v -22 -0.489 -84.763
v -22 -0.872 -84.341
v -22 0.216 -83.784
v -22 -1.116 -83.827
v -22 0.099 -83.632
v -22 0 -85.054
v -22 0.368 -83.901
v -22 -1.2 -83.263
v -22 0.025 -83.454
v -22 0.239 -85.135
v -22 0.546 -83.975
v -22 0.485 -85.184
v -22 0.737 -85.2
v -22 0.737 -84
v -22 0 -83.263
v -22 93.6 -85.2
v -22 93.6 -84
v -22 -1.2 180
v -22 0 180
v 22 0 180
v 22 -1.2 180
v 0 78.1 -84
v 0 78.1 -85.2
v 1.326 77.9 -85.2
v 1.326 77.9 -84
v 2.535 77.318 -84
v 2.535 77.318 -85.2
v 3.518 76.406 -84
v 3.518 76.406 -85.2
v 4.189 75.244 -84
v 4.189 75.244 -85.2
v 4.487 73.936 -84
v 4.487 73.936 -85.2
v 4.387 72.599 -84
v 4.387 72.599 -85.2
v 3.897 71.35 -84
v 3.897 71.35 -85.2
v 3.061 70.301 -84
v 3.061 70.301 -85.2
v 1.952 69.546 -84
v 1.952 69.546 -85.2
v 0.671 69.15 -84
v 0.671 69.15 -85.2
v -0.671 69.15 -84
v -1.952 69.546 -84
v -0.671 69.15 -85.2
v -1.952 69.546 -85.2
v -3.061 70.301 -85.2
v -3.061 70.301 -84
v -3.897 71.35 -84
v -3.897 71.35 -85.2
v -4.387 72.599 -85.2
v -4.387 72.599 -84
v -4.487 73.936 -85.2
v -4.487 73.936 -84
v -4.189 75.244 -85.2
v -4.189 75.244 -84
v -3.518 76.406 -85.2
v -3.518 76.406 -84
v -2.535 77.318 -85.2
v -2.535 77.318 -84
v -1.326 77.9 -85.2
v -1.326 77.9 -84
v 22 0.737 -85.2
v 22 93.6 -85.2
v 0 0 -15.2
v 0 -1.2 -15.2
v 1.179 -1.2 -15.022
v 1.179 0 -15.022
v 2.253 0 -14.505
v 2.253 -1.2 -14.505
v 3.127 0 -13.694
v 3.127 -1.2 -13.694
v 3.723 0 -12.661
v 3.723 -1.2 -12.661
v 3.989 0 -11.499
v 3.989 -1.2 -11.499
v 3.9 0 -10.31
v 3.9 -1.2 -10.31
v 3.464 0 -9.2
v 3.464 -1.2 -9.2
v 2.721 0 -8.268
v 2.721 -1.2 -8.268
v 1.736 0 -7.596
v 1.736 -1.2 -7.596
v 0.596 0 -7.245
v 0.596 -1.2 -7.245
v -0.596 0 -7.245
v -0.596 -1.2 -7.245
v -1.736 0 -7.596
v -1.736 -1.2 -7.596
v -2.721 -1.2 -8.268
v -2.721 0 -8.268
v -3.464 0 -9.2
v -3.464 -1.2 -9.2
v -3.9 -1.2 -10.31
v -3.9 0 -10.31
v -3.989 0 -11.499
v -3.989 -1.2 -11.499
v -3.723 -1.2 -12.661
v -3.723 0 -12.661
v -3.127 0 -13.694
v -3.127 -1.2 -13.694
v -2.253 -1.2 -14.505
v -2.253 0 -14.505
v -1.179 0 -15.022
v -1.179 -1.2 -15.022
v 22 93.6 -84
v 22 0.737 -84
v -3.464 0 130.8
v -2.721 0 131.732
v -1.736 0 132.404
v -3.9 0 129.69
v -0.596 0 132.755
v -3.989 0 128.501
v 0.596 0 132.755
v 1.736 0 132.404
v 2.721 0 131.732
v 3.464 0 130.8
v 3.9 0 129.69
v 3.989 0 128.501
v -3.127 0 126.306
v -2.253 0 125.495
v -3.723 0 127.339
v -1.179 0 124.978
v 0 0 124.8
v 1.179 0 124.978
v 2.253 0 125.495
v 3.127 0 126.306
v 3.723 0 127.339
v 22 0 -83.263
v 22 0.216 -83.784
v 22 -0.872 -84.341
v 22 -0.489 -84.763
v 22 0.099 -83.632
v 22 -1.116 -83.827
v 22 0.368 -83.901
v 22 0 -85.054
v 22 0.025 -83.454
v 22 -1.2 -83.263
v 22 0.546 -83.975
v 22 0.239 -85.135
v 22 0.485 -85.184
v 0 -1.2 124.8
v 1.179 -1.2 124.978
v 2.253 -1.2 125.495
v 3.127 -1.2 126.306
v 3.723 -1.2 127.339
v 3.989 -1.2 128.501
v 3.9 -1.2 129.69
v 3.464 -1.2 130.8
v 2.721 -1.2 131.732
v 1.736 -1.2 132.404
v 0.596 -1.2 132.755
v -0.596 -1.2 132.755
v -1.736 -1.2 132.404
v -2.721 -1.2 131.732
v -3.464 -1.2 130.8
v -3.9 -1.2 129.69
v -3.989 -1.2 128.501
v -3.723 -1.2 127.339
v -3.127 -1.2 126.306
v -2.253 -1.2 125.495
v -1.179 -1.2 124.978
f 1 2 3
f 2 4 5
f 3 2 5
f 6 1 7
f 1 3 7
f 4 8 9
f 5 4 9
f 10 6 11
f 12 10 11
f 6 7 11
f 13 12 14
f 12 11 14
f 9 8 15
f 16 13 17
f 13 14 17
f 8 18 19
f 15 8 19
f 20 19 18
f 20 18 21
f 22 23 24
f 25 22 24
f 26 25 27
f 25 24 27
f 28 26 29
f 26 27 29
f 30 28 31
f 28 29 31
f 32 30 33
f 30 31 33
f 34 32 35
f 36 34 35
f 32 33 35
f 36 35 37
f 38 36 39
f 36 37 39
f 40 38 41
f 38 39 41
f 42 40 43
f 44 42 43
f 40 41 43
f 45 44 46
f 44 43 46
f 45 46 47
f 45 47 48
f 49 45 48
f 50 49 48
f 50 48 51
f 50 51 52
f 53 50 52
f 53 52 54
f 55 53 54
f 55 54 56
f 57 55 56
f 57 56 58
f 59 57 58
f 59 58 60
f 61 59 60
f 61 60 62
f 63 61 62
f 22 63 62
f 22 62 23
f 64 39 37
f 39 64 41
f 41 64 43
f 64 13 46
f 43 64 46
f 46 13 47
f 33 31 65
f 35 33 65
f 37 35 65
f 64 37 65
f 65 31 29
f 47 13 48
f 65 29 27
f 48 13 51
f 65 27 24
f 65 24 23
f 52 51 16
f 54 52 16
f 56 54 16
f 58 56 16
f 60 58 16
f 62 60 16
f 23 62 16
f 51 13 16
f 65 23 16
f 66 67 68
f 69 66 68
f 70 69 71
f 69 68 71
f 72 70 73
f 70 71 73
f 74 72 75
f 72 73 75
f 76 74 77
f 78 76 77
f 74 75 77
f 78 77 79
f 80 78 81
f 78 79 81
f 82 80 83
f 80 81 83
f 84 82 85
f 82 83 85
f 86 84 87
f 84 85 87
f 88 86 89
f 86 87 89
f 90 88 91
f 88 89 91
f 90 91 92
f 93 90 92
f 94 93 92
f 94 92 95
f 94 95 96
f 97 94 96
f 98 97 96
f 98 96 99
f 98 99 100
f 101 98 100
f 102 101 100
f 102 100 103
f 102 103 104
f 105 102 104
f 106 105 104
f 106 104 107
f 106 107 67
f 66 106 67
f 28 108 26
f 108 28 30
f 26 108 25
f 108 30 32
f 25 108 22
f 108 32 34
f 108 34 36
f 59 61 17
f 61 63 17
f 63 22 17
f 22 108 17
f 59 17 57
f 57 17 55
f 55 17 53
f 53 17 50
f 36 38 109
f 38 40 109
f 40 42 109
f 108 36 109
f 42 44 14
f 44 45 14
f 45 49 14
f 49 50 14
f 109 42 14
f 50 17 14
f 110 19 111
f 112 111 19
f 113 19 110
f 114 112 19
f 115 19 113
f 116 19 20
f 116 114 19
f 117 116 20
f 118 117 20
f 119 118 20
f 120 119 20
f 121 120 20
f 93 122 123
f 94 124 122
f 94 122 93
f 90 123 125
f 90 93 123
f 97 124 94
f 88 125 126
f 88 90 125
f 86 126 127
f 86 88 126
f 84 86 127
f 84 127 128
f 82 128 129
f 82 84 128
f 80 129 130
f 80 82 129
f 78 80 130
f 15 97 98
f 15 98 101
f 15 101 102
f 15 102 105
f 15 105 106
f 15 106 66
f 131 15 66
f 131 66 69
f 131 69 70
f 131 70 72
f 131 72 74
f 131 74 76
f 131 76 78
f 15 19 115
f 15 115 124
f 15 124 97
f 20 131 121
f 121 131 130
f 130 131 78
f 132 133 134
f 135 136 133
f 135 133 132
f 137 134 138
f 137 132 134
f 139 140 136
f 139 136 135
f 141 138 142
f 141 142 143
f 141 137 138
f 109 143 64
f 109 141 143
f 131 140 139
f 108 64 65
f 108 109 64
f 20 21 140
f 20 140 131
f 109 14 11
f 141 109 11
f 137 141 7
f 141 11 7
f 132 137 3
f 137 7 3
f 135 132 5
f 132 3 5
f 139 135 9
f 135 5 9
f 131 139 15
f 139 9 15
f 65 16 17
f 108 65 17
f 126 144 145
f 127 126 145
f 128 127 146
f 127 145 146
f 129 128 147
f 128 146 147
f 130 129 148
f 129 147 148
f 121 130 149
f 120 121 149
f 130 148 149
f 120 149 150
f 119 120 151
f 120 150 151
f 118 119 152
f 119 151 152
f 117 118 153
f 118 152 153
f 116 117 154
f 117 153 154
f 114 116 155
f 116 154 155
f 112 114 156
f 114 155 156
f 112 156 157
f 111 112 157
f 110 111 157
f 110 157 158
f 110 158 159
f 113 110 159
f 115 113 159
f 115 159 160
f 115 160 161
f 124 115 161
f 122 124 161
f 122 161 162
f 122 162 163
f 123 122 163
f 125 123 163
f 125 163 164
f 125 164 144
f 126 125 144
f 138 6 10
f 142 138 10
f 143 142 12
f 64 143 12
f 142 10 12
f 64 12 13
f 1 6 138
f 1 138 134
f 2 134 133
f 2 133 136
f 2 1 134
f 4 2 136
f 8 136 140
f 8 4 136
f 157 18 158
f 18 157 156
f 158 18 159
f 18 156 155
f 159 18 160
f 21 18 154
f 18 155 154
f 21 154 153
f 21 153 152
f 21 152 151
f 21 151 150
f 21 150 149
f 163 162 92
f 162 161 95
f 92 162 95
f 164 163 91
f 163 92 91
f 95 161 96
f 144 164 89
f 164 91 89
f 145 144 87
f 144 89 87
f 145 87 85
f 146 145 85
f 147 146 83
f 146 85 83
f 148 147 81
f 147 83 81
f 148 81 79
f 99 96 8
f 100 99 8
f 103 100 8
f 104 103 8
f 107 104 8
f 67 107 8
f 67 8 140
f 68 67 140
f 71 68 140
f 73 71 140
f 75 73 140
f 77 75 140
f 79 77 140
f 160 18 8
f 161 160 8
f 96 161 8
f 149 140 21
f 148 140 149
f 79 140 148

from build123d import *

# Parameters (mm, degrees)
SKETCH1_W              = 44
SKETCH1_H              = 360
BASE_FLANGE1_DEPTH     = 1.2
SKETCHED_START         = -22
SKETCHED_BEND1_DEPTH   = 44
SKETCHED_BEND1_2_DEPTH = 44
SKETCH7_R              = 4.5
CUT_EXTRUDE1_DEPTH     = 10
SKETCH8_R              = 4
CUT_EXTRUDE2_DEPTH     = 10


# Read off the part's stored shape, not the designer's step: Sketched Bend1
# Sheet-metal steps are written as plain solids
with BuildPart() as part:
    # Sketch1 → Base-Flange1 (new body)
    with BuildSketch(Plane(origin=(0, 0, 0), x_dir=(1, 0, 0), z_dir=(0, 1, 0))):
        Rectangle(SKETCH1_W, SKETCH1_H)
    extrude(amount=-BASE_FLANGE1_DEPTH)

    # Sketched Bend1 outline → Sketched Bend1 (cut)
    with BuildSketch(Plane.YZ.offset(SKETCHED_START)):
        with BuildLine():
            Line((0, -180), (0, -85.054444388))
            ThreePointArc((0, -85.054444388), (-0.872269031, -84.341342484), (-1.2, -83.2634))
            Line((-1.2, -83.2634), (-1.2, -180))
            Line((-1.2, -180), (0, -180))
        make_face()
    extrude(amount=SKETCHED_BEND1_DEPTH, mode=Mode.SUBTRACT)

    # Sketched Bend1 2 outline → Sketched Bend1 2 (add)
    with BuildSketch(Plane.YZ.offset(SKETCHED_START)):
        with BuildLine():
            Line((93.6, -84), (0.7366, -84))
            ThreePointArc((0.7366, -84), (0.215745145, -83.784254855), (0, -83.2634))
            Line((0, -83.2634), (0, -85.054444388))
            ThreePointArc((0, -85.054444388), (0.361178238, -85.163262642), (0.7366, -85.2))
            Line((0.7366, -85.2), (93.6, -85.2))
            Line((93.6, -85.2), (93.6, -84))
        make_face()
    extrude(amount=SKETCHED_BEND1_2_DEPTH)

    # Sketch7 → Cut-Extrude1 (cut)
    with BuildSketch(Plane(origin=(0, 0, -85.2), x_dir=(-1, 0, 0), z_dir=(0, 0, -1))):
        with Locations(Location((0, 73.6, 0), (0, 0, 90))):
            Circle(SKETCH7_R)
    extrude(amount=-CUT_EXTRUDE1_DEPTH, mode=Mode.SUBTRACT)

    # Sketch8 → Cut-Extrude2 (cut)
    with BuildSketch(Plane.XZ.offset(1.2)):
        with Locations(Location((0, -11.2, 0), (0, 0, 270))):
            Circle(SKETCH8_R)
        with Locations(Location((0, 128.8, 0), (0, 0, 270))):
            Circle(SKETCH8_R)
    extrude(amount=-CUT_EXTRUDE2_DEPTH, mode=Mode.SUBTRACT)


solid = part.part
